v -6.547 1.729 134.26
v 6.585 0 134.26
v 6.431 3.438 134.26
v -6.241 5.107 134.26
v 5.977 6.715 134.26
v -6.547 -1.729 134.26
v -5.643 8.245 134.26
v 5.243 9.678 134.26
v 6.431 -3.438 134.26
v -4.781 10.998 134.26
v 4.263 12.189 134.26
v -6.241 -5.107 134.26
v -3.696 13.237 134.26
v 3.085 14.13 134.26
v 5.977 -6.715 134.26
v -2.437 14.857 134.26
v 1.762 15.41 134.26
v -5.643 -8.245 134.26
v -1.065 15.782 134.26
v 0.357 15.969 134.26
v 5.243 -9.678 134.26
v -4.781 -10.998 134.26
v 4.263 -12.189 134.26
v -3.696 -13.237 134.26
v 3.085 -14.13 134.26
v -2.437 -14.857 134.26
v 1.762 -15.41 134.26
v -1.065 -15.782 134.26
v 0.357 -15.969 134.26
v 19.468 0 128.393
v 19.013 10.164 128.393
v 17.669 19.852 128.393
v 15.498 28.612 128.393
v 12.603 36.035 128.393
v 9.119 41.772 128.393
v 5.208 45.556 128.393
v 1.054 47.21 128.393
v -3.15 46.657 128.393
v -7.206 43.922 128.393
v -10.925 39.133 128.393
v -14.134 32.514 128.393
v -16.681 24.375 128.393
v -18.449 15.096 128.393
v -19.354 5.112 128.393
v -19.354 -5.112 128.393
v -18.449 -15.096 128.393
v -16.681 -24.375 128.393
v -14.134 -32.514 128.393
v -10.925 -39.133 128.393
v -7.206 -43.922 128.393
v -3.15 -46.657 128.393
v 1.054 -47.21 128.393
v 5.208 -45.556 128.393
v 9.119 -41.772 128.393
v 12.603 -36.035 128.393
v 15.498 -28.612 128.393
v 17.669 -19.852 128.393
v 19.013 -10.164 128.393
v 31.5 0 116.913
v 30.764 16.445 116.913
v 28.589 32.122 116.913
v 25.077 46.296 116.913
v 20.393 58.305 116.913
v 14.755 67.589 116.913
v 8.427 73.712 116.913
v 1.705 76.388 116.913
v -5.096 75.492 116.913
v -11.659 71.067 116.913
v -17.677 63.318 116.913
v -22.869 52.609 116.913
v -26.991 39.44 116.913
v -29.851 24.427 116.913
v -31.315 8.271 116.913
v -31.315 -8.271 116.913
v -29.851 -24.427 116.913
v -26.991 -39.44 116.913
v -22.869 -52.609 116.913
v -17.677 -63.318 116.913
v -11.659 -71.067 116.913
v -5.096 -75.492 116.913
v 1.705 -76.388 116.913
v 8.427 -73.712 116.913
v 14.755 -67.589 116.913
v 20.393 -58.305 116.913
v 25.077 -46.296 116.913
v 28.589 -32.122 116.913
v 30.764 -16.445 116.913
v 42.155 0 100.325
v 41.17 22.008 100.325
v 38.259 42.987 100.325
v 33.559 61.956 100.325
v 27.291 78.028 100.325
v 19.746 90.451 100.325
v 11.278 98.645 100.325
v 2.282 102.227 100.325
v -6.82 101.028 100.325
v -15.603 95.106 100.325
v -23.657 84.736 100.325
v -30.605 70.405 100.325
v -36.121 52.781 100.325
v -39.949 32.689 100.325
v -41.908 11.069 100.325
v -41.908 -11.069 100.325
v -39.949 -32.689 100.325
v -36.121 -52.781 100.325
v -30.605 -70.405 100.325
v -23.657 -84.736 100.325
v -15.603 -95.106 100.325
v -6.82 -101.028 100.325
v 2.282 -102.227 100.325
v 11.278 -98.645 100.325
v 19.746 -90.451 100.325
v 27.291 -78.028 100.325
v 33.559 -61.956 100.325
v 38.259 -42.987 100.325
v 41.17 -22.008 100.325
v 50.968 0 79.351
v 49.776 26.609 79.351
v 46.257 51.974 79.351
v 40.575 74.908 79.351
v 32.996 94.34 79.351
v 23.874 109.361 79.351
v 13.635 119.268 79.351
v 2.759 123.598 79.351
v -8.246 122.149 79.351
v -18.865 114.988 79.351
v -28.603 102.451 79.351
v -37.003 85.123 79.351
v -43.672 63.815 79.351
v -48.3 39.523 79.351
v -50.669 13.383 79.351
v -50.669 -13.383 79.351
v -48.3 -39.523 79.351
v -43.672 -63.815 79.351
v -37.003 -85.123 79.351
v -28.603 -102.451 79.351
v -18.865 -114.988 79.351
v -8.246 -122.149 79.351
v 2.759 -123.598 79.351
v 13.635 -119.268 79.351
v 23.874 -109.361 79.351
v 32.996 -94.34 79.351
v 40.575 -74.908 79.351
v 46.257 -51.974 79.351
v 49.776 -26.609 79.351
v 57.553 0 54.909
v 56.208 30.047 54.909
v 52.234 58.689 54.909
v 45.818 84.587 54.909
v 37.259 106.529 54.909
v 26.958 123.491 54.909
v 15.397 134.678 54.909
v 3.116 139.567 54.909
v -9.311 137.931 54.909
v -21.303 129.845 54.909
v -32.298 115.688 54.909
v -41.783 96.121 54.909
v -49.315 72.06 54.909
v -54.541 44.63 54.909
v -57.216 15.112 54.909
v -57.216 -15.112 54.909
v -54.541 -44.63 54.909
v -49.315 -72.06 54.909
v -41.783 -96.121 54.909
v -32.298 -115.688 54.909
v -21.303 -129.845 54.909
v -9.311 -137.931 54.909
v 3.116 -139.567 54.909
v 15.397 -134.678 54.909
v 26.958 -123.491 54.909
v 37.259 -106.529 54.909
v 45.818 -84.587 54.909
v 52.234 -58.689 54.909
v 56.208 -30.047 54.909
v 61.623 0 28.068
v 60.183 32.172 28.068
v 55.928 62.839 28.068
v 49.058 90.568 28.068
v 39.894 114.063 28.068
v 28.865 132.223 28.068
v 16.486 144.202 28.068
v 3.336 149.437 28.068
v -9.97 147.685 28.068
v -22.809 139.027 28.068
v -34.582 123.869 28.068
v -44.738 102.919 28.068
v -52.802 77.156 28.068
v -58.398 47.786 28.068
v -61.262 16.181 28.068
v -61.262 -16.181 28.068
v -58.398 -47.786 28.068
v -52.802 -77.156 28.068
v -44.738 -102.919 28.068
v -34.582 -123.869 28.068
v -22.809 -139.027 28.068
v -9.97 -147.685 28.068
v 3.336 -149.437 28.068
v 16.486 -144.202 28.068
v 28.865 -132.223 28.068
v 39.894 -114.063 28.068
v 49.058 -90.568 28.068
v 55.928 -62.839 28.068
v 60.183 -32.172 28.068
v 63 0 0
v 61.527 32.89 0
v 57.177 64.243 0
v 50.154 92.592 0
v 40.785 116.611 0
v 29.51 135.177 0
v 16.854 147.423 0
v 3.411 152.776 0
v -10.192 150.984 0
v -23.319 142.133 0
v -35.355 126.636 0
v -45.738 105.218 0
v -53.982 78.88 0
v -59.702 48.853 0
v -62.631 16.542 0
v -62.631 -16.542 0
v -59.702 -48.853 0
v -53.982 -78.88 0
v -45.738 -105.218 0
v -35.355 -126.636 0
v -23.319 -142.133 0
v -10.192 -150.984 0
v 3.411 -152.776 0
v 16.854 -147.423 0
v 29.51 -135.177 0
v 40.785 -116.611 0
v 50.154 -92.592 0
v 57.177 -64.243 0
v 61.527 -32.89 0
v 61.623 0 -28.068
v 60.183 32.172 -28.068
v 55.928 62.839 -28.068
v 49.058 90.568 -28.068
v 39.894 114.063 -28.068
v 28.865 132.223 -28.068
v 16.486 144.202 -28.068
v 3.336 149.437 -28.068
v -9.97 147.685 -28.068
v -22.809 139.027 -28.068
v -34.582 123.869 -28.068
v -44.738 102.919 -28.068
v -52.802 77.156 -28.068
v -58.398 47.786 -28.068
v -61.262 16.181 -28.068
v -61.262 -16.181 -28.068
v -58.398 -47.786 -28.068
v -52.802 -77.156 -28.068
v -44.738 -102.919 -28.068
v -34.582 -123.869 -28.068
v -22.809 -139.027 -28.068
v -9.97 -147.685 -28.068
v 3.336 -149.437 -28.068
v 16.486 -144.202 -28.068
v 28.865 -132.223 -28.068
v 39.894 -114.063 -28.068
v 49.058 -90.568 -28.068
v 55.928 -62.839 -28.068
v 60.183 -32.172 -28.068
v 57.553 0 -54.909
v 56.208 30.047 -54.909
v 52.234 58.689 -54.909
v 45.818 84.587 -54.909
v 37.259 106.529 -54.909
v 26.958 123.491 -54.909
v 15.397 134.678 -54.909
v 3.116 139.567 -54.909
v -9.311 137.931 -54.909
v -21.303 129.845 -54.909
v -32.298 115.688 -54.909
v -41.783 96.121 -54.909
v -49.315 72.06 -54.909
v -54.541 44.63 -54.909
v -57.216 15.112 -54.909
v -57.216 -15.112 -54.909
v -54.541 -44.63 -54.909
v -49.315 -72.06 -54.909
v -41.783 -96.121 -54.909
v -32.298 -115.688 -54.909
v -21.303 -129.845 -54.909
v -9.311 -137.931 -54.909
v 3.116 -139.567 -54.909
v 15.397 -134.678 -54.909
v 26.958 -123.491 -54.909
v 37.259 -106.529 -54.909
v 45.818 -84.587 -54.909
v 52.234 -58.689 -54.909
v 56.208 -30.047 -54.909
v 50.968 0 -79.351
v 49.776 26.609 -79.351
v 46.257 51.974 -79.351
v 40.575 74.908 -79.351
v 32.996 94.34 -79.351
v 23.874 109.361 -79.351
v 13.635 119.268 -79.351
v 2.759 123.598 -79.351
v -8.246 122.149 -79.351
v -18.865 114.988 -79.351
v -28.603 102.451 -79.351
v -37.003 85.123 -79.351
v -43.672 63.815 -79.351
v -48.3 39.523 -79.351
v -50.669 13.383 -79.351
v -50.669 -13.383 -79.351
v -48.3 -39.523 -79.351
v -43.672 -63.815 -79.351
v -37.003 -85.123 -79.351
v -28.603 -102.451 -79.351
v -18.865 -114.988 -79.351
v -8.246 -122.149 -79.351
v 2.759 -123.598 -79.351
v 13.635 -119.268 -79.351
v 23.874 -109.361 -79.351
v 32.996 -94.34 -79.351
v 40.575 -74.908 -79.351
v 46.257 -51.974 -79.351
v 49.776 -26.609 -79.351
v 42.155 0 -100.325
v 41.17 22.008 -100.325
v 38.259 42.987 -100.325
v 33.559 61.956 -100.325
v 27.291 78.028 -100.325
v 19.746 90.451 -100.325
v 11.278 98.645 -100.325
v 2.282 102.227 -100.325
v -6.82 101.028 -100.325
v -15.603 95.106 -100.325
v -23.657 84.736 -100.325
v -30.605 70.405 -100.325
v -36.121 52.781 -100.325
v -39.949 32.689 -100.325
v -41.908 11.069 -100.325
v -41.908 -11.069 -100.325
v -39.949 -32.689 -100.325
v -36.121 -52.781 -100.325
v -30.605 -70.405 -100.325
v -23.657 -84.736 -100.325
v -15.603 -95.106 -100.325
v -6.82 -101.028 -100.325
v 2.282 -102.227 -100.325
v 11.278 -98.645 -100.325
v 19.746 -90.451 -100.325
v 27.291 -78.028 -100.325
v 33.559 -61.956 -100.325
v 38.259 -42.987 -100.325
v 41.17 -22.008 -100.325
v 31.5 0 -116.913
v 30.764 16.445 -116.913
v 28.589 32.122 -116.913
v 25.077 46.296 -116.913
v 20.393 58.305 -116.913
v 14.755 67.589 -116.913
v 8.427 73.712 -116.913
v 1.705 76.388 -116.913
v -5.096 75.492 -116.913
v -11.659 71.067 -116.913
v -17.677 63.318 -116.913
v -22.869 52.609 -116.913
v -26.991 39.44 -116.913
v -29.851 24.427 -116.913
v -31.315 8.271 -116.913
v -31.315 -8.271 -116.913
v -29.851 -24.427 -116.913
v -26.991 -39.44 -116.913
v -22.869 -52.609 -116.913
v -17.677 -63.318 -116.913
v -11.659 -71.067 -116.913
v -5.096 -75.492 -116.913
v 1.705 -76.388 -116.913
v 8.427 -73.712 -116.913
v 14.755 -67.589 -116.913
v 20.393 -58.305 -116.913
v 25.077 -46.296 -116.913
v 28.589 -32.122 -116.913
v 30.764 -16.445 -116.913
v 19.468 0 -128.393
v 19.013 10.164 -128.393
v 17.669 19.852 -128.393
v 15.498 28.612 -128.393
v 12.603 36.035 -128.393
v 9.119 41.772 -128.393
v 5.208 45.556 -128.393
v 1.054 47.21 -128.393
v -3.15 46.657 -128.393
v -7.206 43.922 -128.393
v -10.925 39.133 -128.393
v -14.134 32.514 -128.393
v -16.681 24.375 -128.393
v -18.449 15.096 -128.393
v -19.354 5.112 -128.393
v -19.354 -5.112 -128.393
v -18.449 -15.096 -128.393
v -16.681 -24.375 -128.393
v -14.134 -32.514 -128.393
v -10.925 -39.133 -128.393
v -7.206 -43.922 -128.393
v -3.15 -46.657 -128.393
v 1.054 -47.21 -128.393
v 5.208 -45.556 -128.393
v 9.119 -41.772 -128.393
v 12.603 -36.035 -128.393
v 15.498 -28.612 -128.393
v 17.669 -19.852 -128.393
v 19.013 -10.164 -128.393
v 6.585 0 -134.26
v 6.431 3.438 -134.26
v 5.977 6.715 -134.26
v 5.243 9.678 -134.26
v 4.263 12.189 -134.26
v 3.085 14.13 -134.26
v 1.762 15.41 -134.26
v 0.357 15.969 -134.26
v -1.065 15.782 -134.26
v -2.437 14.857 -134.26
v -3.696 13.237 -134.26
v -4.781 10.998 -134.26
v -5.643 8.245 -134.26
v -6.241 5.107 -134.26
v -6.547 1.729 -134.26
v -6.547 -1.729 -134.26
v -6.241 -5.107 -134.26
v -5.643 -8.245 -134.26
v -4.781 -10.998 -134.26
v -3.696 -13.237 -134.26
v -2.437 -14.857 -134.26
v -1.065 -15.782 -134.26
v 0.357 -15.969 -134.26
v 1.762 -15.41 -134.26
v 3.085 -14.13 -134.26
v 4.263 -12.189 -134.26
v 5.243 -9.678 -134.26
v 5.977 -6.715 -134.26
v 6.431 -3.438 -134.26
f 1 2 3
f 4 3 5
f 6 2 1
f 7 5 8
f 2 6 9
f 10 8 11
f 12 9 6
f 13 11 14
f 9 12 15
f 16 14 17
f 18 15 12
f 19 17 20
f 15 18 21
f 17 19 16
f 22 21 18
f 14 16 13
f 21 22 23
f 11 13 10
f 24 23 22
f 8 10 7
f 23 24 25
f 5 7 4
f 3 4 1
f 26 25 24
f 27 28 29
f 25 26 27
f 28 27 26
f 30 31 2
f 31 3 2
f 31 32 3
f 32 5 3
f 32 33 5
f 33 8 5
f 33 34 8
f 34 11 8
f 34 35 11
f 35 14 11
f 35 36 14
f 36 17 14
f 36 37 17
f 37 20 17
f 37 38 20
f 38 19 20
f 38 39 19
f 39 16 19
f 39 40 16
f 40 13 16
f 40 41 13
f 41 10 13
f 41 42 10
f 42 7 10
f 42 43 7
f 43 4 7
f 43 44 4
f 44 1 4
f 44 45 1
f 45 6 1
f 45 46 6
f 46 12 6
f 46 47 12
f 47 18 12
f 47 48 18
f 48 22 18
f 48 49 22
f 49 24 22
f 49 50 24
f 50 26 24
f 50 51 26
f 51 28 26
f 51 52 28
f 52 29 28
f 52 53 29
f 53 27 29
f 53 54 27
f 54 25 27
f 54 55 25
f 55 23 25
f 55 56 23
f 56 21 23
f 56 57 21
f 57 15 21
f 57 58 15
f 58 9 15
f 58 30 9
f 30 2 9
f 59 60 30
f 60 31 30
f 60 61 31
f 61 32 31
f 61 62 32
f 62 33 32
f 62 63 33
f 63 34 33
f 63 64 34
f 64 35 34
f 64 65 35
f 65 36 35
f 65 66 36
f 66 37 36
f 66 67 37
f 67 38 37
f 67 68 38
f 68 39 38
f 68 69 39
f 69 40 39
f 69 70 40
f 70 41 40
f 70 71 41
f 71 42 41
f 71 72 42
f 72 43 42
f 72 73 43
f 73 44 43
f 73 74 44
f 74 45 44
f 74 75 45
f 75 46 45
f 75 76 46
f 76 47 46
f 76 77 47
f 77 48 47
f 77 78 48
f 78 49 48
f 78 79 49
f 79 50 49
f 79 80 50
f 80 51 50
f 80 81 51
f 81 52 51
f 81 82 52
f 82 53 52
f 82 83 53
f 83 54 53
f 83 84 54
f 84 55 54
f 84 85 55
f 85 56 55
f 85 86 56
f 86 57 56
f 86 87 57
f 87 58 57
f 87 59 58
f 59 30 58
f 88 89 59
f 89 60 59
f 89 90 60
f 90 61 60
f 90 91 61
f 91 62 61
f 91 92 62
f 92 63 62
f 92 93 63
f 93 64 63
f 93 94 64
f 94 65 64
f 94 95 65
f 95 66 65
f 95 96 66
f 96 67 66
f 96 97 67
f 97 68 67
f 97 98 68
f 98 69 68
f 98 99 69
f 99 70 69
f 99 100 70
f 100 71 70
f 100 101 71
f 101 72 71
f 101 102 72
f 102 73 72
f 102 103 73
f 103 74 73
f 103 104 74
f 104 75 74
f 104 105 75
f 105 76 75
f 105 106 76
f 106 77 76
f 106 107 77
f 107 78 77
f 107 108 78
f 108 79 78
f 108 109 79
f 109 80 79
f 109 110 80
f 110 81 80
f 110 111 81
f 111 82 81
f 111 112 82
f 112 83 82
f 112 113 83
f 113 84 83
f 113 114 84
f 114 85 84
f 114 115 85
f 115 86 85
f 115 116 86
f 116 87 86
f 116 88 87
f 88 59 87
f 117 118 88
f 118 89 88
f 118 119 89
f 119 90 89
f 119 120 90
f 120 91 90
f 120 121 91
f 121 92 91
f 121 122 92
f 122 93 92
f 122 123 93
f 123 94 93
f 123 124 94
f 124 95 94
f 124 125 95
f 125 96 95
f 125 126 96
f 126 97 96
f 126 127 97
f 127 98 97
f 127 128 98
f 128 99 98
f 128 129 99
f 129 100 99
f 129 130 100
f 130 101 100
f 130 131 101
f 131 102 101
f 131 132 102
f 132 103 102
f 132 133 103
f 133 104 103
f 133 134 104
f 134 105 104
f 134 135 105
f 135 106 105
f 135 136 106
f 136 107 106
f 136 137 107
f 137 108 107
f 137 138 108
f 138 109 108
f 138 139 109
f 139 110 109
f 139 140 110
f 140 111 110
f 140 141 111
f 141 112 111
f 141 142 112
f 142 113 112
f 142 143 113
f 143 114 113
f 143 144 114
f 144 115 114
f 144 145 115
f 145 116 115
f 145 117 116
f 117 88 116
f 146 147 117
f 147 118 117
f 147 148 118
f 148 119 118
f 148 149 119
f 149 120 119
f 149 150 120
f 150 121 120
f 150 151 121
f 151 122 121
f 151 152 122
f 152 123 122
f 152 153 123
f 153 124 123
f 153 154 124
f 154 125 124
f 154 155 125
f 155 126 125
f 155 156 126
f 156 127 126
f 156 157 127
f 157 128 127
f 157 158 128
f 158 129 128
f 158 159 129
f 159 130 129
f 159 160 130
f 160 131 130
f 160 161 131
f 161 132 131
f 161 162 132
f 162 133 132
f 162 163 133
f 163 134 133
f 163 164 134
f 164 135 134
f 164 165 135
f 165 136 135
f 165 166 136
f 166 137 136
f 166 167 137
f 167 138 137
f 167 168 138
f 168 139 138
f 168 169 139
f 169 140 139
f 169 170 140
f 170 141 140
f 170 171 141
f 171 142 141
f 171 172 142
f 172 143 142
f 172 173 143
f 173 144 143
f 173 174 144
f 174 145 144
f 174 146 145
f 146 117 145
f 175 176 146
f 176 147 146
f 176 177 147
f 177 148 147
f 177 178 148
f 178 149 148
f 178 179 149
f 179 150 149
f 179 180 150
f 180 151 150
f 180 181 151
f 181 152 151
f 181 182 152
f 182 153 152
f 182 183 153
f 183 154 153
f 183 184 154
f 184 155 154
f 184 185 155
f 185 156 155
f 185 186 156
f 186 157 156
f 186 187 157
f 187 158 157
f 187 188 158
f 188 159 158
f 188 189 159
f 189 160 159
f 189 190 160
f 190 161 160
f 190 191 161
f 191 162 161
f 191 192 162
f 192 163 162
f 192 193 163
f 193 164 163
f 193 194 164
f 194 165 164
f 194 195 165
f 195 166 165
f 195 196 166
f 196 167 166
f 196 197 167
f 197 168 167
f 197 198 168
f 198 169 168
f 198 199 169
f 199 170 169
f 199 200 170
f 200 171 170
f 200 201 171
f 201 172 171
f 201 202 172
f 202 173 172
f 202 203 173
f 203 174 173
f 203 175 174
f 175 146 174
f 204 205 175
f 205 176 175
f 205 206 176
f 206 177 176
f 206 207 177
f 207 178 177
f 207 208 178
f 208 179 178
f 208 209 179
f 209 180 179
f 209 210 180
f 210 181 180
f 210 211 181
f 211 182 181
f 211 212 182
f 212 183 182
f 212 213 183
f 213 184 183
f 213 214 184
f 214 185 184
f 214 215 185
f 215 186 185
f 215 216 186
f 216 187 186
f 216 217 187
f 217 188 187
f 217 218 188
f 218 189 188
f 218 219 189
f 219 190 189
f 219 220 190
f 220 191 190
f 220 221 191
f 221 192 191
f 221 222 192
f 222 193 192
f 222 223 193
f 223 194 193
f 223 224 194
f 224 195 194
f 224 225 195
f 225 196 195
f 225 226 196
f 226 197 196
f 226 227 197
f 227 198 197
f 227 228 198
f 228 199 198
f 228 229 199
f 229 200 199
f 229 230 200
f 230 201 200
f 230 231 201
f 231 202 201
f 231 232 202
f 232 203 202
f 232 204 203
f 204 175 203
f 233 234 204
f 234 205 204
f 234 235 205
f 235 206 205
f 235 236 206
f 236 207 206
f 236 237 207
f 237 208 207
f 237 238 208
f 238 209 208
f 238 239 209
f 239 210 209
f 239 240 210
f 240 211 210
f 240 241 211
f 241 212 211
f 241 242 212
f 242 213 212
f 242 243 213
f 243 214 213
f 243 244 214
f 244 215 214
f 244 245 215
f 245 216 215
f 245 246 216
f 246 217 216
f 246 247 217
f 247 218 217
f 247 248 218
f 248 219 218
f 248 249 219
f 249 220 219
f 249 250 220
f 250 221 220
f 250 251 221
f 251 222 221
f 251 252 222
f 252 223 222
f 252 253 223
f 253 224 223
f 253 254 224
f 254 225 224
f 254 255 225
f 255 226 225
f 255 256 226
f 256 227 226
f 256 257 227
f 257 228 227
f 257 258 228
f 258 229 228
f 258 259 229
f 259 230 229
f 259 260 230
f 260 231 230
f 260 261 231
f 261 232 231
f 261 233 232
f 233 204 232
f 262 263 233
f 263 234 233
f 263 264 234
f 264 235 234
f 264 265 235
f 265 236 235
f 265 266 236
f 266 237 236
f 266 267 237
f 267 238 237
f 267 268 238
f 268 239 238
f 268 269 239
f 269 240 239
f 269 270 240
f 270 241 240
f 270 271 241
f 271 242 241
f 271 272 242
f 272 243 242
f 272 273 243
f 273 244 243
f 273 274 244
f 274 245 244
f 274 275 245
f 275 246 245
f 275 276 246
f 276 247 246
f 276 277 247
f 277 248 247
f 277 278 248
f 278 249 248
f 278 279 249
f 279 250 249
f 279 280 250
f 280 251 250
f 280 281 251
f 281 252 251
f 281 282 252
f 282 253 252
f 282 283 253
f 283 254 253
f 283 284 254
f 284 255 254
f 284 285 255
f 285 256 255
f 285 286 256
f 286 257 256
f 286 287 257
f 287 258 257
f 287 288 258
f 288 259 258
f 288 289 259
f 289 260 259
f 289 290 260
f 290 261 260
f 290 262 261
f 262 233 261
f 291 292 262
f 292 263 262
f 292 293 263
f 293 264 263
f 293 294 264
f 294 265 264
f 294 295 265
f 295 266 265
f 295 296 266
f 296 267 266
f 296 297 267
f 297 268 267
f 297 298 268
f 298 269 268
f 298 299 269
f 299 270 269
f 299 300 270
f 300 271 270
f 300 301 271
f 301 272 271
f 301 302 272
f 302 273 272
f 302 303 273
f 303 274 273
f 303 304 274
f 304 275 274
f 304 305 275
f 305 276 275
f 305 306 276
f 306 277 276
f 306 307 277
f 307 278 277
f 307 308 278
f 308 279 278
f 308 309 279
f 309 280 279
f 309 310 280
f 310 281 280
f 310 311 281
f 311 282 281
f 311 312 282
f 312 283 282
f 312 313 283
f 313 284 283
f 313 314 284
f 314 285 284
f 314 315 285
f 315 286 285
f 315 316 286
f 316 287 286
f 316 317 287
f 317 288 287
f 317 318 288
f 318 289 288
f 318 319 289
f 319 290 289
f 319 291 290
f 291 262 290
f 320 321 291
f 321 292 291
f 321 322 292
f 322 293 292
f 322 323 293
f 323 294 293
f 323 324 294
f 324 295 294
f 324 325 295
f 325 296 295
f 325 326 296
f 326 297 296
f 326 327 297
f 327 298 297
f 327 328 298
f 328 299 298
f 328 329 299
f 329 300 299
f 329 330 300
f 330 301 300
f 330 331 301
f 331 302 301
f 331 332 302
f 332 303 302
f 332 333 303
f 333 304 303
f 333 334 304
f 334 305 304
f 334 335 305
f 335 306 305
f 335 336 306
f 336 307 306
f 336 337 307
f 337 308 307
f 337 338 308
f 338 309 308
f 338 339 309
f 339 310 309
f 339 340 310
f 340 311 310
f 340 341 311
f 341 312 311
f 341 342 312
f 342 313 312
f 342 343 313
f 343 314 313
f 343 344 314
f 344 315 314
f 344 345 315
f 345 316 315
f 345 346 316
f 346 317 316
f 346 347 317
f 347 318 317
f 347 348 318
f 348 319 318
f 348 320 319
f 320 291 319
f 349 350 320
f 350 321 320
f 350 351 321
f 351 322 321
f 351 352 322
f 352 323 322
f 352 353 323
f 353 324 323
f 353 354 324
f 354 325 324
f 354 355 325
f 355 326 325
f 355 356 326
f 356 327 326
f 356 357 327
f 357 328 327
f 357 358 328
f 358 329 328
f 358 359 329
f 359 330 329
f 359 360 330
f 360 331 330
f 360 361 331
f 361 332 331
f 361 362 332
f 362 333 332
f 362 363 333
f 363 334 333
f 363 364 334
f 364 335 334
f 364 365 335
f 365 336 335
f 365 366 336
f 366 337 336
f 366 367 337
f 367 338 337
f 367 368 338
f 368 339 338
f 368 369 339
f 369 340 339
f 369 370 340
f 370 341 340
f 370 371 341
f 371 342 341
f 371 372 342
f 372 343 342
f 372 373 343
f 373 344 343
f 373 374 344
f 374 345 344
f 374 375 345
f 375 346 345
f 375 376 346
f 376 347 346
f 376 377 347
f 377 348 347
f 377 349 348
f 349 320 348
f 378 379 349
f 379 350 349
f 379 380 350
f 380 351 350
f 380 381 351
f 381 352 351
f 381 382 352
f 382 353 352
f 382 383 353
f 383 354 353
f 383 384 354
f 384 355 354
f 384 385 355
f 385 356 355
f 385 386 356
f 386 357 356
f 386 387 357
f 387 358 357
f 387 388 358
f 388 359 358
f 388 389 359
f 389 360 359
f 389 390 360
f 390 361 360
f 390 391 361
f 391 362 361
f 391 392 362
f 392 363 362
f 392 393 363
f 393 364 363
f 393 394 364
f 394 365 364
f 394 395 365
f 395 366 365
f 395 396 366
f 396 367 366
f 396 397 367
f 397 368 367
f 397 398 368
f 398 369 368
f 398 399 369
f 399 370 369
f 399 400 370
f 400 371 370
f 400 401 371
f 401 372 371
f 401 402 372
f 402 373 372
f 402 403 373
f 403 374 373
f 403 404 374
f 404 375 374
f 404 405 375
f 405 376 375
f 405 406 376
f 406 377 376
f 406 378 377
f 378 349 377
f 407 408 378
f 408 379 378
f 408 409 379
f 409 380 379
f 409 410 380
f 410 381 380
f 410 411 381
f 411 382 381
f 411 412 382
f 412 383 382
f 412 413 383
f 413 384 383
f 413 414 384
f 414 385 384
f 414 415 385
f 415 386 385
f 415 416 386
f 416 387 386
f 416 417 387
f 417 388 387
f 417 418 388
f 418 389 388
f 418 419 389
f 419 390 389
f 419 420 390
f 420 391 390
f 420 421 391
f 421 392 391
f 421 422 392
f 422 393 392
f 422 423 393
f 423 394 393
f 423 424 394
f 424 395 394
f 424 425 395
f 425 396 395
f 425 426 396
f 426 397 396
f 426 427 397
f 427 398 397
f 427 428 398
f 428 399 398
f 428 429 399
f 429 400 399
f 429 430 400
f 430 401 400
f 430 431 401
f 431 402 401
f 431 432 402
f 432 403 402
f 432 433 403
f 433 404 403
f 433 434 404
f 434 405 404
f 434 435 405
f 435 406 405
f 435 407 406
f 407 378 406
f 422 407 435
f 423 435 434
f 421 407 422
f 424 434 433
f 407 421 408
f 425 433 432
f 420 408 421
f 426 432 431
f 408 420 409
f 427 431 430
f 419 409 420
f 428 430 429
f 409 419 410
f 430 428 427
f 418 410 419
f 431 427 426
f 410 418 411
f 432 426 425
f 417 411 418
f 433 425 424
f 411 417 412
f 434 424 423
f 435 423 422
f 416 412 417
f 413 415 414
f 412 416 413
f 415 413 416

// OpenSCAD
// Generated by SolidPython 1.0.1 on 2020-07-29 00:46:48


scale(v = [7, 17, 15]) {
	sphere(r = 9);
}
/***********************************************
*********      SolidPython code:      **********
************************************************
 
# import packages: SolidPython
from solid import *
from solid.utils import *
from itertools import chain, combinations, permutations


class Resize:

    def __init__(self, scad_file):
        self.scad_file = scad_file
        #self.scad_file = import_scad(scad_file)
        # cone/cylinder param:
        self.r1 = 0
        self.r2 = 0
        self.h = 0
        # rectangular prism param:
        self.w = 0
        self.l = 0
        # ellipse param:
        self.r = 0

    # import OpenScad code (file name corresponds to shape)


    # classify shape + parameters
    def assign(self, param1, param2, param3):
        if self.scad_file == 'cone.scad':
            self.r1 = param1
            self.r2 = param2
            self.h = param3
        elif self.scad_file == 'cylinder.scad':
            self.r1 = param1
            self.r2 = param2
            self.h = param3
        elif self.scad_file == 'rectangularPrism.scad':
            self.h = param1
            self.l = param2
            self.w = param3
        else:
            self.r = param1
            self.h = param2

    # resize parameters
    def iterate(self):
        x = range(3, 20, 2)
        i = 1
        if self.scad_file == 'cone.scad':
            tempList = list(permutations(x, 2))
            for temp in tempList:
                param1 = temp[0]
                param2 = temp[1]
                filepath = 'produced_scad_files/' + 'cone' + str(param1) + '_' + str(param2) + '_' + '.scad'
                scad_render_to_file(cylinder(h=param1, r1=param2, r2=0), filepath)

        elif self.scad_file == 'cylinder.scad':
            tempList = list(permutations(x, 3))
            for temp in tempList:
                param1 = temp[0]
                param2 = temp[1]
                filepath = 'produced_scad_files/' + 'cylinder' + str(param1) + '_' + str(param2) + '_' + '.scad'
                scad_render_to_file(cylinder(h=param1, r1=param2, r2=param2), filepath)

        elif self.scad_file == 'rectangularPrism.scad':
            tempList = list(permutations(x, 3))
            for temp in tempList:
                param1 = temp[0]
                param2 = temp[1]
                param3 = temp[2]
                filepath = 'produced_scad_files/' + 'rectangularPrism' + str(param1) + '_' + str(param2) + '_' + str(
                    param3) + '.scad'
                scad_render_to_file(cube(size=(param1, param2, param3)), filepath)

        elif self.scad_file == 'ellipse.scad':
            tempList = list(permutations(x, 4))
            for temp in tempList:
                param1 = temp[0]
                param2 = temp[1]
                param3 = temp[2]
                param4 = temp[3]
                filepath = 'produced_scad_files/' + 'ellipse' + str(param1) + '_' + str(param2) + '_' + str(param3) + '_' + str(param4) + '.scad'
                scad_render_to_file(scale([param1, param2, param3])(sphere(r=param4)), filepath)

    def render_to_scadfile(self):
        scad_render_to_file(scad, 'example.scad') 
 
************************************************/
